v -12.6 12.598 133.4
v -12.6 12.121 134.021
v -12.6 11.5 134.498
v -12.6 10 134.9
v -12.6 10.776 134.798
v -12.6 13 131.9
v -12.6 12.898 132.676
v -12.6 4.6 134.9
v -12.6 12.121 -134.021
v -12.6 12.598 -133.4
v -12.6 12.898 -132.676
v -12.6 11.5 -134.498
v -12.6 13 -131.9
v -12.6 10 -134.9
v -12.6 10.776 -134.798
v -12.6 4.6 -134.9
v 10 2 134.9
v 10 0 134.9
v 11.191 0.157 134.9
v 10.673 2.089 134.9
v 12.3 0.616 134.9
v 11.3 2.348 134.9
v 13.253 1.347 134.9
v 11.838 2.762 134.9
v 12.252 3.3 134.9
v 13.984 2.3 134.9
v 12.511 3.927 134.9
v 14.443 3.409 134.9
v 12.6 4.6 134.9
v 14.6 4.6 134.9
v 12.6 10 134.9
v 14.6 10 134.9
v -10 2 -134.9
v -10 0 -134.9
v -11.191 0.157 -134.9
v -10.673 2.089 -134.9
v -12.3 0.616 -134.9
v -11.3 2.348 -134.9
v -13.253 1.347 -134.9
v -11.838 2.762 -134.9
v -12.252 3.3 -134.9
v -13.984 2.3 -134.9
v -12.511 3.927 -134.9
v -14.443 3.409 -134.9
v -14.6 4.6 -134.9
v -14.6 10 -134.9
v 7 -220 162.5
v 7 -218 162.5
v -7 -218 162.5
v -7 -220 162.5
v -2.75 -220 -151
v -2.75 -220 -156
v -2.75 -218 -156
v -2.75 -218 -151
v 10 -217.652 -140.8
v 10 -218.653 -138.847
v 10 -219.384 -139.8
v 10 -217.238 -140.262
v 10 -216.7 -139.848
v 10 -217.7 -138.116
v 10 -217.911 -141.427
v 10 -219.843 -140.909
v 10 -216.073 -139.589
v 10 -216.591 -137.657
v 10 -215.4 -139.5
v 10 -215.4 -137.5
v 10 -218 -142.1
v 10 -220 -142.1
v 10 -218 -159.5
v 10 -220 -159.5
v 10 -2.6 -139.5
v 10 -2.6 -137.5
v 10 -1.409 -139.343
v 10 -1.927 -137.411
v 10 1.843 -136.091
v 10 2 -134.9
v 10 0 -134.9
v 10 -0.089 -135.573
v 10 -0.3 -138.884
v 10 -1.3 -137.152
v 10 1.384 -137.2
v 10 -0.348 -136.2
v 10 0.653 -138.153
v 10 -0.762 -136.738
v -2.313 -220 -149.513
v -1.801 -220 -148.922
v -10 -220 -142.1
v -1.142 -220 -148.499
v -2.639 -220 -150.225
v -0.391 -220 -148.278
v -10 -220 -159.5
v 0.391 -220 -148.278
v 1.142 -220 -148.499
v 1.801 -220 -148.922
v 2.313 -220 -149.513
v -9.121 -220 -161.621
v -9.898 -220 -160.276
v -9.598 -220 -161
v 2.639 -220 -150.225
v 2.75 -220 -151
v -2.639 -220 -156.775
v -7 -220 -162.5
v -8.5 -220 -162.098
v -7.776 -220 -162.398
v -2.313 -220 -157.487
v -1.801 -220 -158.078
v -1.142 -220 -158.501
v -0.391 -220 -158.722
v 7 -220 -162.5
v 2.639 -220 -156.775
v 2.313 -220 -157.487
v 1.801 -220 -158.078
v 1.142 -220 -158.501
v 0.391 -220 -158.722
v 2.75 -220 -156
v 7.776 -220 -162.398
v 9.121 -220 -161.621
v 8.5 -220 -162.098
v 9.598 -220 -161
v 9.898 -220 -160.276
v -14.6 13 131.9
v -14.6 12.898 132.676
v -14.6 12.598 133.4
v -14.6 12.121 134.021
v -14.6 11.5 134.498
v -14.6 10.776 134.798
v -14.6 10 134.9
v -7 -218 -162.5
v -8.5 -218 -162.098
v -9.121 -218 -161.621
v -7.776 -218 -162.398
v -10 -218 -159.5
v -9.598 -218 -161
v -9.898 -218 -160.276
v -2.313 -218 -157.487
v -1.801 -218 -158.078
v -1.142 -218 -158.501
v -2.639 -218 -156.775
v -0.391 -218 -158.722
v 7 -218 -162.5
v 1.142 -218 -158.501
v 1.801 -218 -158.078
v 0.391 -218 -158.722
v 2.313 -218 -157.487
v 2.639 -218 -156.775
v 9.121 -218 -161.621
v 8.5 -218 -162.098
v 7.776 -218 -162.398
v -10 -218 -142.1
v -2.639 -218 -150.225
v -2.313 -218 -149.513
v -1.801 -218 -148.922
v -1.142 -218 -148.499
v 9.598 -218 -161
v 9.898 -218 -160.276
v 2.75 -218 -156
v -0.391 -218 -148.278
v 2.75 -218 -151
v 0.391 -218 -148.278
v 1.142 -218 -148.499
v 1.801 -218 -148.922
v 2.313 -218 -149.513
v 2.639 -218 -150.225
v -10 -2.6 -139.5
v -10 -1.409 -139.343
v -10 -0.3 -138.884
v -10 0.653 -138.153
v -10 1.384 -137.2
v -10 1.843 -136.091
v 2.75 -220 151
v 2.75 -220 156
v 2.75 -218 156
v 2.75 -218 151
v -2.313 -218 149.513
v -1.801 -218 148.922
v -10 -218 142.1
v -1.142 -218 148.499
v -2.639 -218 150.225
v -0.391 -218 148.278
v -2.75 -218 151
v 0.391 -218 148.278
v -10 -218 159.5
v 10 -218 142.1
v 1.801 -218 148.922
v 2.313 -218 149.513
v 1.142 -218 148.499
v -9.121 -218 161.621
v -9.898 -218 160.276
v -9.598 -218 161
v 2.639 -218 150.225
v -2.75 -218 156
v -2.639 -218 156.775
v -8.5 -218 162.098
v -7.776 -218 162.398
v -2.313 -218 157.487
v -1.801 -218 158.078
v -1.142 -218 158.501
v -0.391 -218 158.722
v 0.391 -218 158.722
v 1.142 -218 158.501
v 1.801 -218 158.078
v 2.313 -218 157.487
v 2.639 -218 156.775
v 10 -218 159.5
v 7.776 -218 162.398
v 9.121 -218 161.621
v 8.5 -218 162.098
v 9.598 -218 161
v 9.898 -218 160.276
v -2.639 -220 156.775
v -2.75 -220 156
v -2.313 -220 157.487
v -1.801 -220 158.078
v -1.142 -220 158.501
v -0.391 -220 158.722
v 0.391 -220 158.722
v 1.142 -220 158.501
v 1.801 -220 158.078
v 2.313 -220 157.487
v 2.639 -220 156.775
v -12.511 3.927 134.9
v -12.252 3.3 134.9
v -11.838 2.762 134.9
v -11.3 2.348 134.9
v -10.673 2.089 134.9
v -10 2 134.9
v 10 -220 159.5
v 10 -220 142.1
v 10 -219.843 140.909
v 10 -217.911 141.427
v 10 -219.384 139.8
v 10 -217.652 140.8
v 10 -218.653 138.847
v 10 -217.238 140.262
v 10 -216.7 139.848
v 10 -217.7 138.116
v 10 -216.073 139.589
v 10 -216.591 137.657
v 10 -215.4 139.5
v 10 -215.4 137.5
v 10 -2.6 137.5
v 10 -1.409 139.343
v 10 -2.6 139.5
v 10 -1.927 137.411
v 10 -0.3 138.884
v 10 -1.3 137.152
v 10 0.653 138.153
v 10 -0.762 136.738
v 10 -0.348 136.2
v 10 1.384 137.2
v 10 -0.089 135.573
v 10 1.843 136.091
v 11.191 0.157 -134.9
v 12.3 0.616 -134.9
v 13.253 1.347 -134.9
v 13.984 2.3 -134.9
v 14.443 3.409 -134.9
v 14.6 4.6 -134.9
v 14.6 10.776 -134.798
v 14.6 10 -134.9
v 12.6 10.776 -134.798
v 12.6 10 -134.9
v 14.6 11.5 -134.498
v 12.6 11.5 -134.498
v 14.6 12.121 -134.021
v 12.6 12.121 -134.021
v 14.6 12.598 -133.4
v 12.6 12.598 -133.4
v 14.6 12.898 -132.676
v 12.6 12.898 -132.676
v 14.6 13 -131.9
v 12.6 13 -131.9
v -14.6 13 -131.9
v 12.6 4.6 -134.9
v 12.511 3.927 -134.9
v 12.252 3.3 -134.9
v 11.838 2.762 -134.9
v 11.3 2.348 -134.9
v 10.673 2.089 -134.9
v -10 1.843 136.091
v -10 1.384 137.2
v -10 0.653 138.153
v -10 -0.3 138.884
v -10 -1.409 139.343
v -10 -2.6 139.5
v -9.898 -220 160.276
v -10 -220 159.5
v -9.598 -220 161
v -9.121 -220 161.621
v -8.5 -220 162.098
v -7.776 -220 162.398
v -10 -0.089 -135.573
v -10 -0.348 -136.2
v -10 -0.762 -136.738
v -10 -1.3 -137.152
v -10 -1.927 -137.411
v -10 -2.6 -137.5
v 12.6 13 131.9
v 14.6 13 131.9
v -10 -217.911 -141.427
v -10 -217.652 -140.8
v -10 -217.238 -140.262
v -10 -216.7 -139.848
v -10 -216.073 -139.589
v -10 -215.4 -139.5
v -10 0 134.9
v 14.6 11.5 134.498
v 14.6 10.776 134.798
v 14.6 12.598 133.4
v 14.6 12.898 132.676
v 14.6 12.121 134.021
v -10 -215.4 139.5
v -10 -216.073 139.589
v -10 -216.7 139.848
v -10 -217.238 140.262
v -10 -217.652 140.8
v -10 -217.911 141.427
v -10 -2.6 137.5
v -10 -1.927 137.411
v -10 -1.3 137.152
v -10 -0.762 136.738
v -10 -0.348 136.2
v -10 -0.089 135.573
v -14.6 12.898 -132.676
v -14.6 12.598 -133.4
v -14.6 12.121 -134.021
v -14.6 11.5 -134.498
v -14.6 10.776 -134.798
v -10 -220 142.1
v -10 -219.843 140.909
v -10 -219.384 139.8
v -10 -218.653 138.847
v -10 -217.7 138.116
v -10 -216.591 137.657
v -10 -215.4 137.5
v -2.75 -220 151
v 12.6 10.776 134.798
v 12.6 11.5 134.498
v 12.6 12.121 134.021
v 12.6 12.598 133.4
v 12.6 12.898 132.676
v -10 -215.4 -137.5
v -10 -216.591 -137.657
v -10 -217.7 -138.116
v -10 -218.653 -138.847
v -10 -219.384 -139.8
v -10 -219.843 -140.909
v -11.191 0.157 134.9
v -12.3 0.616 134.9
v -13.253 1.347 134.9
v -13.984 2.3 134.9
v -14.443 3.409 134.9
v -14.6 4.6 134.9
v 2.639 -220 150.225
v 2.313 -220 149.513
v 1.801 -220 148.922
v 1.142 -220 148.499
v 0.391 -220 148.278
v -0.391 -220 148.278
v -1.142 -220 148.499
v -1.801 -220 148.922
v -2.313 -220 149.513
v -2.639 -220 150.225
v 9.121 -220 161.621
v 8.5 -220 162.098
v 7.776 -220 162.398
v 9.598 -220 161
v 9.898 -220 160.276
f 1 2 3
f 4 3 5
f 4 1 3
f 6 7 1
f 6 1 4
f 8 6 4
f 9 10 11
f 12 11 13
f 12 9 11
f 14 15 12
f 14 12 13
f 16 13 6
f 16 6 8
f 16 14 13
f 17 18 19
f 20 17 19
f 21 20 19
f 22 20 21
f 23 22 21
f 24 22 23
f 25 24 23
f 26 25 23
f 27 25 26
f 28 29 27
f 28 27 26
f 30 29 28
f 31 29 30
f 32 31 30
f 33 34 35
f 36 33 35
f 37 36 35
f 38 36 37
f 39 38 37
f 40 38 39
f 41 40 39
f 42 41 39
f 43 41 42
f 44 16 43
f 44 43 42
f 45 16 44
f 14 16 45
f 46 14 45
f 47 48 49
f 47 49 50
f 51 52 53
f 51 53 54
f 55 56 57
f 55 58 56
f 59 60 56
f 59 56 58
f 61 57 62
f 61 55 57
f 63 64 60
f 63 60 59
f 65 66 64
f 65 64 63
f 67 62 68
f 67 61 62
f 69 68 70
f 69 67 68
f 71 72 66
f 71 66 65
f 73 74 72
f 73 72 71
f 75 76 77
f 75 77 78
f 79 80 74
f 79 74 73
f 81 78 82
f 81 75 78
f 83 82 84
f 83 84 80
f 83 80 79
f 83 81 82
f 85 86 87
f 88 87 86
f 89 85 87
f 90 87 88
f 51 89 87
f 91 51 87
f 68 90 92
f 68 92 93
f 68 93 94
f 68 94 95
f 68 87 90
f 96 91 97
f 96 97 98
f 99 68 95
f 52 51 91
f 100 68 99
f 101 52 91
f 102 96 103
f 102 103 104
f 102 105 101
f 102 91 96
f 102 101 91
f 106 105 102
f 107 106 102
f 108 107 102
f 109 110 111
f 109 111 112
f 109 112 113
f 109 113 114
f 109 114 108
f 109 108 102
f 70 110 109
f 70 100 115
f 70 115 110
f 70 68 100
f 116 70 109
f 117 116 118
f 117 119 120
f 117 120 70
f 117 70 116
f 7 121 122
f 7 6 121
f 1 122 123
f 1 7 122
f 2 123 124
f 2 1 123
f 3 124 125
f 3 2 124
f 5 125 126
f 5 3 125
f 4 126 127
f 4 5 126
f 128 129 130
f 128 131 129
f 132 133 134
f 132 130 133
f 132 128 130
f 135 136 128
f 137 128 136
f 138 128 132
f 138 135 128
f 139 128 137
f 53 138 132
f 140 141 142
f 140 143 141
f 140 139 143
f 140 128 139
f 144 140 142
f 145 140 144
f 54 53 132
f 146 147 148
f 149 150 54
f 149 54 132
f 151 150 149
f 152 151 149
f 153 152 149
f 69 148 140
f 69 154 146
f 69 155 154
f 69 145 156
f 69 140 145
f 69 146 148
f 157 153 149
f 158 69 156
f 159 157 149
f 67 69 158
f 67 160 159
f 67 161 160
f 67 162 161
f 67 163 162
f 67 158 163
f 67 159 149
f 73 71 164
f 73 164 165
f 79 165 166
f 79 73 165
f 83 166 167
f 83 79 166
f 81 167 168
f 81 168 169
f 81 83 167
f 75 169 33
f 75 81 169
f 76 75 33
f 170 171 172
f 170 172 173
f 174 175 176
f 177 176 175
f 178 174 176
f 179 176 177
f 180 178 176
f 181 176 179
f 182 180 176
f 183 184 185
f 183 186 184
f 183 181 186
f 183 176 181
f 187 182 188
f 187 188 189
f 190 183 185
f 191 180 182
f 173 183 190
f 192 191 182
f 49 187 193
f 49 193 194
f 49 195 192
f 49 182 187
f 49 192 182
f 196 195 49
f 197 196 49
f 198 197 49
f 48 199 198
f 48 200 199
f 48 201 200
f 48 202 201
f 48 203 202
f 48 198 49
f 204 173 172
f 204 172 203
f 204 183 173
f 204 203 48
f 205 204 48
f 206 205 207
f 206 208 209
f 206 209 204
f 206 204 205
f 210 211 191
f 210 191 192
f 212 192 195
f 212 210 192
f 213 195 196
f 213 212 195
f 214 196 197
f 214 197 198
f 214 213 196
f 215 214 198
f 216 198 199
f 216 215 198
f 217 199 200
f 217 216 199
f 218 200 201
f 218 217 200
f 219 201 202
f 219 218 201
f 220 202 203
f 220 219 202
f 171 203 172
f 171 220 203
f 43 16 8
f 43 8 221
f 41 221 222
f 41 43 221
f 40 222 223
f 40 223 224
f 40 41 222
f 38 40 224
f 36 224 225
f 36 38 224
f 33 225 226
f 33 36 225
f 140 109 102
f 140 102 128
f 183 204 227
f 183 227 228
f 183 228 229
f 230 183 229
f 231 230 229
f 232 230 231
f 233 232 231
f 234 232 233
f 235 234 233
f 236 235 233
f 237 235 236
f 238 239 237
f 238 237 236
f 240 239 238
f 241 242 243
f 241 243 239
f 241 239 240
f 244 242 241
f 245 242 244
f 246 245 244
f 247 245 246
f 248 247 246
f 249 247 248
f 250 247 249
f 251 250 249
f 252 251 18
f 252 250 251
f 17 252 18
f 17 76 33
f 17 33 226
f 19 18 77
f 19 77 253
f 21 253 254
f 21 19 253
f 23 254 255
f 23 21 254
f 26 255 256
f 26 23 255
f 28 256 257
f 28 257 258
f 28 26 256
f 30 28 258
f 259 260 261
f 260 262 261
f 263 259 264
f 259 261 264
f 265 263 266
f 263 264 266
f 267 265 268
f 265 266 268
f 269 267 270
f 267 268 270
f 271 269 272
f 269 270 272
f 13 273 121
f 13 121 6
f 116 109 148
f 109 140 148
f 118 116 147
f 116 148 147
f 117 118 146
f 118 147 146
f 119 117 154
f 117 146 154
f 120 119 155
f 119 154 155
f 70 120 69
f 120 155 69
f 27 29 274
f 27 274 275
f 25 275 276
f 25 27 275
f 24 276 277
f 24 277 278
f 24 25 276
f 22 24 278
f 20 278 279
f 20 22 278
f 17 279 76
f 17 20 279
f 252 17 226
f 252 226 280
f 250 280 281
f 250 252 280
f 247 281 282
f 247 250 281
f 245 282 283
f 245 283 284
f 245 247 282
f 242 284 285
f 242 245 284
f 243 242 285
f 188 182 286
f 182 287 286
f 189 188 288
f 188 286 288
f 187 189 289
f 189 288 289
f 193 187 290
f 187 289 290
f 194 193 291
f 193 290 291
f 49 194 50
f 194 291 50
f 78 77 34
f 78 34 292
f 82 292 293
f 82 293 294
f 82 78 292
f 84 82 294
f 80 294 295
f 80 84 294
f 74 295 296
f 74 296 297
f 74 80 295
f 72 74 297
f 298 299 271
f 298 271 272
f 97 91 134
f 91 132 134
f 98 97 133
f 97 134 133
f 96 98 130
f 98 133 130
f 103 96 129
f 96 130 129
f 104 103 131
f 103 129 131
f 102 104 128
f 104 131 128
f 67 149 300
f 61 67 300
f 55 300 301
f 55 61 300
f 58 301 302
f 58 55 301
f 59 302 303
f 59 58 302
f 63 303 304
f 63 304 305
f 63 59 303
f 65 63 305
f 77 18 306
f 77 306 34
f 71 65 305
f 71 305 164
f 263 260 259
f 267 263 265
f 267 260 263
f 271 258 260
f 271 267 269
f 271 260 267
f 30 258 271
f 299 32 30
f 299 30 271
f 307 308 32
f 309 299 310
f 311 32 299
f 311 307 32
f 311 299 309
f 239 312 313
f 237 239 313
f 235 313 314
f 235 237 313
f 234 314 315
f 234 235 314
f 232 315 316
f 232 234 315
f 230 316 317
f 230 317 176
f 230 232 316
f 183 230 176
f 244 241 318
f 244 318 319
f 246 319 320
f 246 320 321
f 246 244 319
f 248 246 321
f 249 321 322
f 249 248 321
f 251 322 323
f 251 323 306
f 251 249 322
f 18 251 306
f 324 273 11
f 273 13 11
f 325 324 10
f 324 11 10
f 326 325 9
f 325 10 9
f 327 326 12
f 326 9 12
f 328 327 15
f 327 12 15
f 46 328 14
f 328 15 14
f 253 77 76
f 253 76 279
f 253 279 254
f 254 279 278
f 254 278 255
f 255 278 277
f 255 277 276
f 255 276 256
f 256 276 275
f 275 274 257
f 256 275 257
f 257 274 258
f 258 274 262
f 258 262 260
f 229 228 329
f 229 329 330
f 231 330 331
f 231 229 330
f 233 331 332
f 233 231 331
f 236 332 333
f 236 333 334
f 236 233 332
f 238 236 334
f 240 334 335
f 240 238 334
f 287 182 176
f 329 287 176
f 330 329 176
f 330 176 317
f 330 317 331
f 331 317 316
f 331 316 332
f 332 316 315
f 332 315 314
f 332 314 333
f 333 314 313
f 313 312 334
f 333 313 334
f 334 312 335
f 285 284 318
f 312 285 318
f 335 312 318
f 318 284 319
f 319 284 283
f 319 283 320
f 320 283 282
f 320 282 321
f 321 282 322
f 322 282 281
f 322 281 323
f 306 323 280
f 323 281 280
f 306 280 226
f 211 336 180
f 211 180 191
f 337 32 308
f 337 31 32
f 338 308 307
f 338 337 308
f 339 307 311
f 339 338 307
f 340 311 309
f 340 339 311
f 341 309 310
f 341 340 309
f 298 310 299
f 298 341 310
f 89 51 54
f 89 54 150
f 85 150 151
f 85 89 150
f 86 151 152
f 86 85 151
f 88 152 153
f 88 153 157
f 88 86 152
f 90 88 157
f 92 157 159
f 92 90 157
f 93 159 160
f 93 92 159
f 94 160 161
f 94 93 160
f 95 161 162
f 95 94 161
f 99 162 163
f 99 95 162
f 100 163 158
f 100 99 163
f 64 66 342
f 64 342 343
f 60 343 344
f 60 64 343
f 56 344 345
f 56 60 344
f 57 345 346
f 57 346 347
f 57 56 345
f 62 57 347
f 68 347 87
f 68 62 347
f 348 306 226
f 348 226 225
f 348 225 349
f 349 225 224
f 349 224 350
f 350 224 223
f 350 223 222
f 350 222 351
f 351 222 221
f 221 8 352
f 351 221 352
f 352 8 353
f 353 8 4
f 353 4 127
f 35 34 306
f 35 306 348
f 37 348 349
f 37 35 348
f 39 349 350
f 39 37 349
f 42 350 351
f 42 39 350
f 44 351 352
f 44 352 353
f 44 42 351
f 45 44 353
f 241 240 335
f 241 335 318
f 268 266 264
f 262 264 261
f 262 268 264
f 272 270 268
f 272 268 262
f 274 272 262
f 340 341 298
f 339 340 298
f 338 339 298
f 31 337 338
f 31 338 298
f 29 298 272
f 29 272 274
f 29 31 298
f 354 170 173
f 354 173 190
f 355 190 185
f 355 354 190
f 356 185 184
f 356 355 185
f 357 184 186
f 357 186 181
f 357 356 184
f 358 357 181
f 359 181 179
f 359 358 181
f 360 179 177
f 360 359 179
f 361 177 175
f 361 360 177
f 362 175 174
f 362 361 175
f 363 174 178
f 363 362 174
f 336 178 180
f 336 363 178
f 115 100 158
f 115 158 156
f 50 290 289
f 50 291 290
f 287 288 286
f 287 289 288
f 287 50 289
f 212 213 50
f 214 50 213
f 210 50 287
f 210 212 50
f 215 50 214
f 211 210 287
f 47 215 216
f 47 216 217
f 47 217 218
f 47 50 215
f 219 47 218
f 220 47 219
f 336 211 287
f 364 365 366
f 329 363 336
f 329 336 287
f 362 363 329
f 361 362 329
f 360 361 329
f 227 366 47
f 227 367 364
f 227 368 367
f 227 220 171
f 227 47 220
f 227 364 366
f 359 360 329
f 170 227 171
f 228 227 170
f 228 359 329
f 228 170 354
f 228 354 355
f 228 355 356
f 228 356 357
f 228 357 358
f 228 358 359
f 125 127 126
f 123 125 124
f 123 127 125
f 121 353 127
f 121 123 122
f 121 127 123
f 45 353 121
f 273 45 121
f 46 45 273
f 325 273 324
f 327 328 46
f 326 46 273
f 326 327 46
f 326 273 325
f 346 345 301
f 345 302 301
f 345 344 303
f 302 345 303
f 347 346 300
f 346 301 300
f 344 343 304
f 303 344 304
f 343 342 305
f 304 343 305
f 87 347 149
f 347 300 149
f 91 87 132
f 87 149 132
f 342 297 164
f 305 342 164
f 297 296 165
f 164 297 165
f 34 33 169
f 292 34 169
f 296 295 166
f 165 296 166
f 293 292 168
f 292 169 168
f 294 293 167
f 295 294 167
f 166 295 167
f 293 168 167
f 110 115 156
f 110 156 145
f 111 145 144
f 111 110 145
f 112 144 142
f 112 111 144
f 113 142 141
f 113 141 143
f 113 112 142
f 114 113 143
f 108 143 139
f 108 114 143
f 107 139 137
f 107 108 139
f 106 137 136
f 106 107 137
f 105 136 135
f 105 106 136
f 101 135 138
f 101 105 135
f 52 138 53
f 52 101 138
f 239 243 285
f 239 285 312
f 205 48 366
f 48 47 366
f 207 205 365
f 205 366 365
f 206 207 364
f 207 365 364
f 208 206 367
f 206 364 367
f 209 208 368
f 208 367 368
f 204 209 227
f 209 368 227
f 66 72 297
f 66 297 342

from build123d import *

# Parameters (mm, degrees)
ODGI_CIE_BAZOWE1_DEPTH        = 10
ODGI_CIE_KRAW_DZI1_DEPTH      = 269.8
ODGI_CIE_KRAW_DZI1_BEND_DEPTH = 269.8
SZCZELINA_START               = -220
SZCZELINA_POD_RUB_M51_DEPTH   = 2
ZAOKR_GLENIE1_R               = 3


# Read off the part's stored shape, not the designer's step: Szczelina pod śrubę M51
# Sheet-metal steps are written as plain solids
with BuildPart() as part:
    # Szkic1 → Odgięcie bazowe1 (new, symmetric)
    with BuildSketch(Plane(origin=(0, 0, 0), x_dir=(0, 0, -1), z_dir=(1, 0, 0))):
        with BuildLine():
            Line((-162.5, -220), (-142.1, -220))
            ThreePointArc((-142.1, -220), (-138.847308807, -218.652691193), (-137.5, -215.4))
            Line((-137.5, -215.4), (-137.5, -2.6))
            ThreePointArc((-137.5, -2.6), (-136.738477631, -0.761522369), (-134.9, 0))
            Line((-134.9, 0), (134.9, 0))
            ThreePointArc((134.9, 0), (136.738477631, -0.761522369), (137.5, -2.6))
            Line((137.5, -2.6), (137.5, -215.4))
            ThreePointArc((137.5, -215.4), (138.847308807, -218.652691193), (142.1, -220))
            Line((142.1, -220), (162.5, -220))
            Line((162.5, -220), (162.5, -218))
            Line((162.5, -218), (142.1, -218))
            ThreePointArc((142.1, -218), (140.261522369, -217.238477631), (139.5, -215.4))
            Line((139.5, -215.4), (139.5, -2.6))
            ThreePointArc((139.5, -2.6), (138.152691193, 0.652691193), (134.9, 2))
            Line((134.9, 2), (-134.9, 2))
            ThreePointArc((-134.9, 2), (-138.152691193, 0.652691193), (-139.5, -2.6))
            Line((-139.5, -2.6), (-139.5, -215.4))
            ThreePointArc((-139.5, -215.4), (-140.261522369, -217.238477631), (-142.1, -218))
            Line((-142.1, -218), (-162.5, -218))
            Line((-162.5, -218), (-162.5, -220))
        make_face()
    extrude(amount=ODGI_CIE_BAZOWE1_DEPTH, both=True)

    # Odgięcie krawędzi1 section (across the edge) → Odgięcie krawędzi1 (add)
    with BuildSketch(Plane(origin=(12.6, 2, 134.9), x_dir=(-1, 0, 0), z_dir=(0, 0, -1))):
        with BuildLine():
            Line((-2, 2.6), (-2, 11))
            Line((-2, 11), (0, 11))
            Line((0, 11), (0, 2.6))
            ThreePointArc((0, 2.6), (0.761522369, 0.761522369), (2.6, 0))
            Line((2.6, 0), (2.6, -2))
            ThreePointArc((2.6, -2), (-0.652691193, -0.652691193), (-2, 2.6))
        make_face()
    extrude(amount=ODGI_CIE_KRAW_DZI1_DEPTH)

    # Odgięcie krawędzi1 section 2 (across the edge) → Odgięcie krawędzi1 bend (add)
    with BuildSketch(Plane(origin=(-12.6, 2, -134.9), x_dir=(1, 0, 0), z_dir=(0, 0, 1))):
        with BuildLine():
            Line((-2, 2.6), (-2, 11))
            Line((-2, 11), (0, 11))
            Line((0, 11), (0, 2.6))
            ThreePointArc((0, 2.6), (0.761522369, 0.761522369), (2.6, 0))
            Line((2.6, 0), (2.6, -2))
            ThreePointArc((2.6, -2), (-0.652691193, -0.652691193), (-2, 2.6))
        make_face()
    extrude(amount=ODGI_CIE_KRAW_DZI1_BEND_DEPTH)

    # Szczelina pod śrubę M51 outline → Szczelina pod śrubę M51 (cut)
    with BuildSketch(Plane(origin=(0, 0, 0), x_dir=(1, 0, 0), z_dir=(0, 1, 0)).offset(SZCZELINA_START)):
        with BuildLine():
            Line((2.75, 151), (2.75, 156))
            ThreePointArc((2.75, 156), (0, 158.75), (-2.75, 156))
            Line((-2.75, 156), (-2.75, 151))
            ThreePointArc((-2.75, 151), (0, 148.25), (2.75, 151))
        make_face()
        with BuildLine():
            ThreePointArc((2.75, -151), (0, -148.25), (-2.75, -151))
            Line((-2.75, -151), (-2.75, -156))
            ThreePointArc((-2.75, -156), (0, -158.75), (2.75, -156))
            Line((2.75, -156), (2.75, -151))
        make_face()
    extrude(amount=SZCZELINA_POD_RUB_M51_DEPTH, mode=Mode.SUBTRACT)

    # Zaokrąglenie1
    zaokr_glenie1_edges = [part.edges().sort_by_distance(p)[0] for p in [
        (-13.6, 13, 134.9),
        (-10, -219, -162.5),
        (-10, -219, 162.5),
        (10, -219, -162.5),
        (13.6, 13, 134.9),
        (13.6, 13, -134.9),
        (10, -219, 162.5),
        (-13.6, 13, -134.9),
    ]]
    fillet(zaokr_glenie1_edges, radius=ZAOKR_GLENIE1_R)


solid = part.part
